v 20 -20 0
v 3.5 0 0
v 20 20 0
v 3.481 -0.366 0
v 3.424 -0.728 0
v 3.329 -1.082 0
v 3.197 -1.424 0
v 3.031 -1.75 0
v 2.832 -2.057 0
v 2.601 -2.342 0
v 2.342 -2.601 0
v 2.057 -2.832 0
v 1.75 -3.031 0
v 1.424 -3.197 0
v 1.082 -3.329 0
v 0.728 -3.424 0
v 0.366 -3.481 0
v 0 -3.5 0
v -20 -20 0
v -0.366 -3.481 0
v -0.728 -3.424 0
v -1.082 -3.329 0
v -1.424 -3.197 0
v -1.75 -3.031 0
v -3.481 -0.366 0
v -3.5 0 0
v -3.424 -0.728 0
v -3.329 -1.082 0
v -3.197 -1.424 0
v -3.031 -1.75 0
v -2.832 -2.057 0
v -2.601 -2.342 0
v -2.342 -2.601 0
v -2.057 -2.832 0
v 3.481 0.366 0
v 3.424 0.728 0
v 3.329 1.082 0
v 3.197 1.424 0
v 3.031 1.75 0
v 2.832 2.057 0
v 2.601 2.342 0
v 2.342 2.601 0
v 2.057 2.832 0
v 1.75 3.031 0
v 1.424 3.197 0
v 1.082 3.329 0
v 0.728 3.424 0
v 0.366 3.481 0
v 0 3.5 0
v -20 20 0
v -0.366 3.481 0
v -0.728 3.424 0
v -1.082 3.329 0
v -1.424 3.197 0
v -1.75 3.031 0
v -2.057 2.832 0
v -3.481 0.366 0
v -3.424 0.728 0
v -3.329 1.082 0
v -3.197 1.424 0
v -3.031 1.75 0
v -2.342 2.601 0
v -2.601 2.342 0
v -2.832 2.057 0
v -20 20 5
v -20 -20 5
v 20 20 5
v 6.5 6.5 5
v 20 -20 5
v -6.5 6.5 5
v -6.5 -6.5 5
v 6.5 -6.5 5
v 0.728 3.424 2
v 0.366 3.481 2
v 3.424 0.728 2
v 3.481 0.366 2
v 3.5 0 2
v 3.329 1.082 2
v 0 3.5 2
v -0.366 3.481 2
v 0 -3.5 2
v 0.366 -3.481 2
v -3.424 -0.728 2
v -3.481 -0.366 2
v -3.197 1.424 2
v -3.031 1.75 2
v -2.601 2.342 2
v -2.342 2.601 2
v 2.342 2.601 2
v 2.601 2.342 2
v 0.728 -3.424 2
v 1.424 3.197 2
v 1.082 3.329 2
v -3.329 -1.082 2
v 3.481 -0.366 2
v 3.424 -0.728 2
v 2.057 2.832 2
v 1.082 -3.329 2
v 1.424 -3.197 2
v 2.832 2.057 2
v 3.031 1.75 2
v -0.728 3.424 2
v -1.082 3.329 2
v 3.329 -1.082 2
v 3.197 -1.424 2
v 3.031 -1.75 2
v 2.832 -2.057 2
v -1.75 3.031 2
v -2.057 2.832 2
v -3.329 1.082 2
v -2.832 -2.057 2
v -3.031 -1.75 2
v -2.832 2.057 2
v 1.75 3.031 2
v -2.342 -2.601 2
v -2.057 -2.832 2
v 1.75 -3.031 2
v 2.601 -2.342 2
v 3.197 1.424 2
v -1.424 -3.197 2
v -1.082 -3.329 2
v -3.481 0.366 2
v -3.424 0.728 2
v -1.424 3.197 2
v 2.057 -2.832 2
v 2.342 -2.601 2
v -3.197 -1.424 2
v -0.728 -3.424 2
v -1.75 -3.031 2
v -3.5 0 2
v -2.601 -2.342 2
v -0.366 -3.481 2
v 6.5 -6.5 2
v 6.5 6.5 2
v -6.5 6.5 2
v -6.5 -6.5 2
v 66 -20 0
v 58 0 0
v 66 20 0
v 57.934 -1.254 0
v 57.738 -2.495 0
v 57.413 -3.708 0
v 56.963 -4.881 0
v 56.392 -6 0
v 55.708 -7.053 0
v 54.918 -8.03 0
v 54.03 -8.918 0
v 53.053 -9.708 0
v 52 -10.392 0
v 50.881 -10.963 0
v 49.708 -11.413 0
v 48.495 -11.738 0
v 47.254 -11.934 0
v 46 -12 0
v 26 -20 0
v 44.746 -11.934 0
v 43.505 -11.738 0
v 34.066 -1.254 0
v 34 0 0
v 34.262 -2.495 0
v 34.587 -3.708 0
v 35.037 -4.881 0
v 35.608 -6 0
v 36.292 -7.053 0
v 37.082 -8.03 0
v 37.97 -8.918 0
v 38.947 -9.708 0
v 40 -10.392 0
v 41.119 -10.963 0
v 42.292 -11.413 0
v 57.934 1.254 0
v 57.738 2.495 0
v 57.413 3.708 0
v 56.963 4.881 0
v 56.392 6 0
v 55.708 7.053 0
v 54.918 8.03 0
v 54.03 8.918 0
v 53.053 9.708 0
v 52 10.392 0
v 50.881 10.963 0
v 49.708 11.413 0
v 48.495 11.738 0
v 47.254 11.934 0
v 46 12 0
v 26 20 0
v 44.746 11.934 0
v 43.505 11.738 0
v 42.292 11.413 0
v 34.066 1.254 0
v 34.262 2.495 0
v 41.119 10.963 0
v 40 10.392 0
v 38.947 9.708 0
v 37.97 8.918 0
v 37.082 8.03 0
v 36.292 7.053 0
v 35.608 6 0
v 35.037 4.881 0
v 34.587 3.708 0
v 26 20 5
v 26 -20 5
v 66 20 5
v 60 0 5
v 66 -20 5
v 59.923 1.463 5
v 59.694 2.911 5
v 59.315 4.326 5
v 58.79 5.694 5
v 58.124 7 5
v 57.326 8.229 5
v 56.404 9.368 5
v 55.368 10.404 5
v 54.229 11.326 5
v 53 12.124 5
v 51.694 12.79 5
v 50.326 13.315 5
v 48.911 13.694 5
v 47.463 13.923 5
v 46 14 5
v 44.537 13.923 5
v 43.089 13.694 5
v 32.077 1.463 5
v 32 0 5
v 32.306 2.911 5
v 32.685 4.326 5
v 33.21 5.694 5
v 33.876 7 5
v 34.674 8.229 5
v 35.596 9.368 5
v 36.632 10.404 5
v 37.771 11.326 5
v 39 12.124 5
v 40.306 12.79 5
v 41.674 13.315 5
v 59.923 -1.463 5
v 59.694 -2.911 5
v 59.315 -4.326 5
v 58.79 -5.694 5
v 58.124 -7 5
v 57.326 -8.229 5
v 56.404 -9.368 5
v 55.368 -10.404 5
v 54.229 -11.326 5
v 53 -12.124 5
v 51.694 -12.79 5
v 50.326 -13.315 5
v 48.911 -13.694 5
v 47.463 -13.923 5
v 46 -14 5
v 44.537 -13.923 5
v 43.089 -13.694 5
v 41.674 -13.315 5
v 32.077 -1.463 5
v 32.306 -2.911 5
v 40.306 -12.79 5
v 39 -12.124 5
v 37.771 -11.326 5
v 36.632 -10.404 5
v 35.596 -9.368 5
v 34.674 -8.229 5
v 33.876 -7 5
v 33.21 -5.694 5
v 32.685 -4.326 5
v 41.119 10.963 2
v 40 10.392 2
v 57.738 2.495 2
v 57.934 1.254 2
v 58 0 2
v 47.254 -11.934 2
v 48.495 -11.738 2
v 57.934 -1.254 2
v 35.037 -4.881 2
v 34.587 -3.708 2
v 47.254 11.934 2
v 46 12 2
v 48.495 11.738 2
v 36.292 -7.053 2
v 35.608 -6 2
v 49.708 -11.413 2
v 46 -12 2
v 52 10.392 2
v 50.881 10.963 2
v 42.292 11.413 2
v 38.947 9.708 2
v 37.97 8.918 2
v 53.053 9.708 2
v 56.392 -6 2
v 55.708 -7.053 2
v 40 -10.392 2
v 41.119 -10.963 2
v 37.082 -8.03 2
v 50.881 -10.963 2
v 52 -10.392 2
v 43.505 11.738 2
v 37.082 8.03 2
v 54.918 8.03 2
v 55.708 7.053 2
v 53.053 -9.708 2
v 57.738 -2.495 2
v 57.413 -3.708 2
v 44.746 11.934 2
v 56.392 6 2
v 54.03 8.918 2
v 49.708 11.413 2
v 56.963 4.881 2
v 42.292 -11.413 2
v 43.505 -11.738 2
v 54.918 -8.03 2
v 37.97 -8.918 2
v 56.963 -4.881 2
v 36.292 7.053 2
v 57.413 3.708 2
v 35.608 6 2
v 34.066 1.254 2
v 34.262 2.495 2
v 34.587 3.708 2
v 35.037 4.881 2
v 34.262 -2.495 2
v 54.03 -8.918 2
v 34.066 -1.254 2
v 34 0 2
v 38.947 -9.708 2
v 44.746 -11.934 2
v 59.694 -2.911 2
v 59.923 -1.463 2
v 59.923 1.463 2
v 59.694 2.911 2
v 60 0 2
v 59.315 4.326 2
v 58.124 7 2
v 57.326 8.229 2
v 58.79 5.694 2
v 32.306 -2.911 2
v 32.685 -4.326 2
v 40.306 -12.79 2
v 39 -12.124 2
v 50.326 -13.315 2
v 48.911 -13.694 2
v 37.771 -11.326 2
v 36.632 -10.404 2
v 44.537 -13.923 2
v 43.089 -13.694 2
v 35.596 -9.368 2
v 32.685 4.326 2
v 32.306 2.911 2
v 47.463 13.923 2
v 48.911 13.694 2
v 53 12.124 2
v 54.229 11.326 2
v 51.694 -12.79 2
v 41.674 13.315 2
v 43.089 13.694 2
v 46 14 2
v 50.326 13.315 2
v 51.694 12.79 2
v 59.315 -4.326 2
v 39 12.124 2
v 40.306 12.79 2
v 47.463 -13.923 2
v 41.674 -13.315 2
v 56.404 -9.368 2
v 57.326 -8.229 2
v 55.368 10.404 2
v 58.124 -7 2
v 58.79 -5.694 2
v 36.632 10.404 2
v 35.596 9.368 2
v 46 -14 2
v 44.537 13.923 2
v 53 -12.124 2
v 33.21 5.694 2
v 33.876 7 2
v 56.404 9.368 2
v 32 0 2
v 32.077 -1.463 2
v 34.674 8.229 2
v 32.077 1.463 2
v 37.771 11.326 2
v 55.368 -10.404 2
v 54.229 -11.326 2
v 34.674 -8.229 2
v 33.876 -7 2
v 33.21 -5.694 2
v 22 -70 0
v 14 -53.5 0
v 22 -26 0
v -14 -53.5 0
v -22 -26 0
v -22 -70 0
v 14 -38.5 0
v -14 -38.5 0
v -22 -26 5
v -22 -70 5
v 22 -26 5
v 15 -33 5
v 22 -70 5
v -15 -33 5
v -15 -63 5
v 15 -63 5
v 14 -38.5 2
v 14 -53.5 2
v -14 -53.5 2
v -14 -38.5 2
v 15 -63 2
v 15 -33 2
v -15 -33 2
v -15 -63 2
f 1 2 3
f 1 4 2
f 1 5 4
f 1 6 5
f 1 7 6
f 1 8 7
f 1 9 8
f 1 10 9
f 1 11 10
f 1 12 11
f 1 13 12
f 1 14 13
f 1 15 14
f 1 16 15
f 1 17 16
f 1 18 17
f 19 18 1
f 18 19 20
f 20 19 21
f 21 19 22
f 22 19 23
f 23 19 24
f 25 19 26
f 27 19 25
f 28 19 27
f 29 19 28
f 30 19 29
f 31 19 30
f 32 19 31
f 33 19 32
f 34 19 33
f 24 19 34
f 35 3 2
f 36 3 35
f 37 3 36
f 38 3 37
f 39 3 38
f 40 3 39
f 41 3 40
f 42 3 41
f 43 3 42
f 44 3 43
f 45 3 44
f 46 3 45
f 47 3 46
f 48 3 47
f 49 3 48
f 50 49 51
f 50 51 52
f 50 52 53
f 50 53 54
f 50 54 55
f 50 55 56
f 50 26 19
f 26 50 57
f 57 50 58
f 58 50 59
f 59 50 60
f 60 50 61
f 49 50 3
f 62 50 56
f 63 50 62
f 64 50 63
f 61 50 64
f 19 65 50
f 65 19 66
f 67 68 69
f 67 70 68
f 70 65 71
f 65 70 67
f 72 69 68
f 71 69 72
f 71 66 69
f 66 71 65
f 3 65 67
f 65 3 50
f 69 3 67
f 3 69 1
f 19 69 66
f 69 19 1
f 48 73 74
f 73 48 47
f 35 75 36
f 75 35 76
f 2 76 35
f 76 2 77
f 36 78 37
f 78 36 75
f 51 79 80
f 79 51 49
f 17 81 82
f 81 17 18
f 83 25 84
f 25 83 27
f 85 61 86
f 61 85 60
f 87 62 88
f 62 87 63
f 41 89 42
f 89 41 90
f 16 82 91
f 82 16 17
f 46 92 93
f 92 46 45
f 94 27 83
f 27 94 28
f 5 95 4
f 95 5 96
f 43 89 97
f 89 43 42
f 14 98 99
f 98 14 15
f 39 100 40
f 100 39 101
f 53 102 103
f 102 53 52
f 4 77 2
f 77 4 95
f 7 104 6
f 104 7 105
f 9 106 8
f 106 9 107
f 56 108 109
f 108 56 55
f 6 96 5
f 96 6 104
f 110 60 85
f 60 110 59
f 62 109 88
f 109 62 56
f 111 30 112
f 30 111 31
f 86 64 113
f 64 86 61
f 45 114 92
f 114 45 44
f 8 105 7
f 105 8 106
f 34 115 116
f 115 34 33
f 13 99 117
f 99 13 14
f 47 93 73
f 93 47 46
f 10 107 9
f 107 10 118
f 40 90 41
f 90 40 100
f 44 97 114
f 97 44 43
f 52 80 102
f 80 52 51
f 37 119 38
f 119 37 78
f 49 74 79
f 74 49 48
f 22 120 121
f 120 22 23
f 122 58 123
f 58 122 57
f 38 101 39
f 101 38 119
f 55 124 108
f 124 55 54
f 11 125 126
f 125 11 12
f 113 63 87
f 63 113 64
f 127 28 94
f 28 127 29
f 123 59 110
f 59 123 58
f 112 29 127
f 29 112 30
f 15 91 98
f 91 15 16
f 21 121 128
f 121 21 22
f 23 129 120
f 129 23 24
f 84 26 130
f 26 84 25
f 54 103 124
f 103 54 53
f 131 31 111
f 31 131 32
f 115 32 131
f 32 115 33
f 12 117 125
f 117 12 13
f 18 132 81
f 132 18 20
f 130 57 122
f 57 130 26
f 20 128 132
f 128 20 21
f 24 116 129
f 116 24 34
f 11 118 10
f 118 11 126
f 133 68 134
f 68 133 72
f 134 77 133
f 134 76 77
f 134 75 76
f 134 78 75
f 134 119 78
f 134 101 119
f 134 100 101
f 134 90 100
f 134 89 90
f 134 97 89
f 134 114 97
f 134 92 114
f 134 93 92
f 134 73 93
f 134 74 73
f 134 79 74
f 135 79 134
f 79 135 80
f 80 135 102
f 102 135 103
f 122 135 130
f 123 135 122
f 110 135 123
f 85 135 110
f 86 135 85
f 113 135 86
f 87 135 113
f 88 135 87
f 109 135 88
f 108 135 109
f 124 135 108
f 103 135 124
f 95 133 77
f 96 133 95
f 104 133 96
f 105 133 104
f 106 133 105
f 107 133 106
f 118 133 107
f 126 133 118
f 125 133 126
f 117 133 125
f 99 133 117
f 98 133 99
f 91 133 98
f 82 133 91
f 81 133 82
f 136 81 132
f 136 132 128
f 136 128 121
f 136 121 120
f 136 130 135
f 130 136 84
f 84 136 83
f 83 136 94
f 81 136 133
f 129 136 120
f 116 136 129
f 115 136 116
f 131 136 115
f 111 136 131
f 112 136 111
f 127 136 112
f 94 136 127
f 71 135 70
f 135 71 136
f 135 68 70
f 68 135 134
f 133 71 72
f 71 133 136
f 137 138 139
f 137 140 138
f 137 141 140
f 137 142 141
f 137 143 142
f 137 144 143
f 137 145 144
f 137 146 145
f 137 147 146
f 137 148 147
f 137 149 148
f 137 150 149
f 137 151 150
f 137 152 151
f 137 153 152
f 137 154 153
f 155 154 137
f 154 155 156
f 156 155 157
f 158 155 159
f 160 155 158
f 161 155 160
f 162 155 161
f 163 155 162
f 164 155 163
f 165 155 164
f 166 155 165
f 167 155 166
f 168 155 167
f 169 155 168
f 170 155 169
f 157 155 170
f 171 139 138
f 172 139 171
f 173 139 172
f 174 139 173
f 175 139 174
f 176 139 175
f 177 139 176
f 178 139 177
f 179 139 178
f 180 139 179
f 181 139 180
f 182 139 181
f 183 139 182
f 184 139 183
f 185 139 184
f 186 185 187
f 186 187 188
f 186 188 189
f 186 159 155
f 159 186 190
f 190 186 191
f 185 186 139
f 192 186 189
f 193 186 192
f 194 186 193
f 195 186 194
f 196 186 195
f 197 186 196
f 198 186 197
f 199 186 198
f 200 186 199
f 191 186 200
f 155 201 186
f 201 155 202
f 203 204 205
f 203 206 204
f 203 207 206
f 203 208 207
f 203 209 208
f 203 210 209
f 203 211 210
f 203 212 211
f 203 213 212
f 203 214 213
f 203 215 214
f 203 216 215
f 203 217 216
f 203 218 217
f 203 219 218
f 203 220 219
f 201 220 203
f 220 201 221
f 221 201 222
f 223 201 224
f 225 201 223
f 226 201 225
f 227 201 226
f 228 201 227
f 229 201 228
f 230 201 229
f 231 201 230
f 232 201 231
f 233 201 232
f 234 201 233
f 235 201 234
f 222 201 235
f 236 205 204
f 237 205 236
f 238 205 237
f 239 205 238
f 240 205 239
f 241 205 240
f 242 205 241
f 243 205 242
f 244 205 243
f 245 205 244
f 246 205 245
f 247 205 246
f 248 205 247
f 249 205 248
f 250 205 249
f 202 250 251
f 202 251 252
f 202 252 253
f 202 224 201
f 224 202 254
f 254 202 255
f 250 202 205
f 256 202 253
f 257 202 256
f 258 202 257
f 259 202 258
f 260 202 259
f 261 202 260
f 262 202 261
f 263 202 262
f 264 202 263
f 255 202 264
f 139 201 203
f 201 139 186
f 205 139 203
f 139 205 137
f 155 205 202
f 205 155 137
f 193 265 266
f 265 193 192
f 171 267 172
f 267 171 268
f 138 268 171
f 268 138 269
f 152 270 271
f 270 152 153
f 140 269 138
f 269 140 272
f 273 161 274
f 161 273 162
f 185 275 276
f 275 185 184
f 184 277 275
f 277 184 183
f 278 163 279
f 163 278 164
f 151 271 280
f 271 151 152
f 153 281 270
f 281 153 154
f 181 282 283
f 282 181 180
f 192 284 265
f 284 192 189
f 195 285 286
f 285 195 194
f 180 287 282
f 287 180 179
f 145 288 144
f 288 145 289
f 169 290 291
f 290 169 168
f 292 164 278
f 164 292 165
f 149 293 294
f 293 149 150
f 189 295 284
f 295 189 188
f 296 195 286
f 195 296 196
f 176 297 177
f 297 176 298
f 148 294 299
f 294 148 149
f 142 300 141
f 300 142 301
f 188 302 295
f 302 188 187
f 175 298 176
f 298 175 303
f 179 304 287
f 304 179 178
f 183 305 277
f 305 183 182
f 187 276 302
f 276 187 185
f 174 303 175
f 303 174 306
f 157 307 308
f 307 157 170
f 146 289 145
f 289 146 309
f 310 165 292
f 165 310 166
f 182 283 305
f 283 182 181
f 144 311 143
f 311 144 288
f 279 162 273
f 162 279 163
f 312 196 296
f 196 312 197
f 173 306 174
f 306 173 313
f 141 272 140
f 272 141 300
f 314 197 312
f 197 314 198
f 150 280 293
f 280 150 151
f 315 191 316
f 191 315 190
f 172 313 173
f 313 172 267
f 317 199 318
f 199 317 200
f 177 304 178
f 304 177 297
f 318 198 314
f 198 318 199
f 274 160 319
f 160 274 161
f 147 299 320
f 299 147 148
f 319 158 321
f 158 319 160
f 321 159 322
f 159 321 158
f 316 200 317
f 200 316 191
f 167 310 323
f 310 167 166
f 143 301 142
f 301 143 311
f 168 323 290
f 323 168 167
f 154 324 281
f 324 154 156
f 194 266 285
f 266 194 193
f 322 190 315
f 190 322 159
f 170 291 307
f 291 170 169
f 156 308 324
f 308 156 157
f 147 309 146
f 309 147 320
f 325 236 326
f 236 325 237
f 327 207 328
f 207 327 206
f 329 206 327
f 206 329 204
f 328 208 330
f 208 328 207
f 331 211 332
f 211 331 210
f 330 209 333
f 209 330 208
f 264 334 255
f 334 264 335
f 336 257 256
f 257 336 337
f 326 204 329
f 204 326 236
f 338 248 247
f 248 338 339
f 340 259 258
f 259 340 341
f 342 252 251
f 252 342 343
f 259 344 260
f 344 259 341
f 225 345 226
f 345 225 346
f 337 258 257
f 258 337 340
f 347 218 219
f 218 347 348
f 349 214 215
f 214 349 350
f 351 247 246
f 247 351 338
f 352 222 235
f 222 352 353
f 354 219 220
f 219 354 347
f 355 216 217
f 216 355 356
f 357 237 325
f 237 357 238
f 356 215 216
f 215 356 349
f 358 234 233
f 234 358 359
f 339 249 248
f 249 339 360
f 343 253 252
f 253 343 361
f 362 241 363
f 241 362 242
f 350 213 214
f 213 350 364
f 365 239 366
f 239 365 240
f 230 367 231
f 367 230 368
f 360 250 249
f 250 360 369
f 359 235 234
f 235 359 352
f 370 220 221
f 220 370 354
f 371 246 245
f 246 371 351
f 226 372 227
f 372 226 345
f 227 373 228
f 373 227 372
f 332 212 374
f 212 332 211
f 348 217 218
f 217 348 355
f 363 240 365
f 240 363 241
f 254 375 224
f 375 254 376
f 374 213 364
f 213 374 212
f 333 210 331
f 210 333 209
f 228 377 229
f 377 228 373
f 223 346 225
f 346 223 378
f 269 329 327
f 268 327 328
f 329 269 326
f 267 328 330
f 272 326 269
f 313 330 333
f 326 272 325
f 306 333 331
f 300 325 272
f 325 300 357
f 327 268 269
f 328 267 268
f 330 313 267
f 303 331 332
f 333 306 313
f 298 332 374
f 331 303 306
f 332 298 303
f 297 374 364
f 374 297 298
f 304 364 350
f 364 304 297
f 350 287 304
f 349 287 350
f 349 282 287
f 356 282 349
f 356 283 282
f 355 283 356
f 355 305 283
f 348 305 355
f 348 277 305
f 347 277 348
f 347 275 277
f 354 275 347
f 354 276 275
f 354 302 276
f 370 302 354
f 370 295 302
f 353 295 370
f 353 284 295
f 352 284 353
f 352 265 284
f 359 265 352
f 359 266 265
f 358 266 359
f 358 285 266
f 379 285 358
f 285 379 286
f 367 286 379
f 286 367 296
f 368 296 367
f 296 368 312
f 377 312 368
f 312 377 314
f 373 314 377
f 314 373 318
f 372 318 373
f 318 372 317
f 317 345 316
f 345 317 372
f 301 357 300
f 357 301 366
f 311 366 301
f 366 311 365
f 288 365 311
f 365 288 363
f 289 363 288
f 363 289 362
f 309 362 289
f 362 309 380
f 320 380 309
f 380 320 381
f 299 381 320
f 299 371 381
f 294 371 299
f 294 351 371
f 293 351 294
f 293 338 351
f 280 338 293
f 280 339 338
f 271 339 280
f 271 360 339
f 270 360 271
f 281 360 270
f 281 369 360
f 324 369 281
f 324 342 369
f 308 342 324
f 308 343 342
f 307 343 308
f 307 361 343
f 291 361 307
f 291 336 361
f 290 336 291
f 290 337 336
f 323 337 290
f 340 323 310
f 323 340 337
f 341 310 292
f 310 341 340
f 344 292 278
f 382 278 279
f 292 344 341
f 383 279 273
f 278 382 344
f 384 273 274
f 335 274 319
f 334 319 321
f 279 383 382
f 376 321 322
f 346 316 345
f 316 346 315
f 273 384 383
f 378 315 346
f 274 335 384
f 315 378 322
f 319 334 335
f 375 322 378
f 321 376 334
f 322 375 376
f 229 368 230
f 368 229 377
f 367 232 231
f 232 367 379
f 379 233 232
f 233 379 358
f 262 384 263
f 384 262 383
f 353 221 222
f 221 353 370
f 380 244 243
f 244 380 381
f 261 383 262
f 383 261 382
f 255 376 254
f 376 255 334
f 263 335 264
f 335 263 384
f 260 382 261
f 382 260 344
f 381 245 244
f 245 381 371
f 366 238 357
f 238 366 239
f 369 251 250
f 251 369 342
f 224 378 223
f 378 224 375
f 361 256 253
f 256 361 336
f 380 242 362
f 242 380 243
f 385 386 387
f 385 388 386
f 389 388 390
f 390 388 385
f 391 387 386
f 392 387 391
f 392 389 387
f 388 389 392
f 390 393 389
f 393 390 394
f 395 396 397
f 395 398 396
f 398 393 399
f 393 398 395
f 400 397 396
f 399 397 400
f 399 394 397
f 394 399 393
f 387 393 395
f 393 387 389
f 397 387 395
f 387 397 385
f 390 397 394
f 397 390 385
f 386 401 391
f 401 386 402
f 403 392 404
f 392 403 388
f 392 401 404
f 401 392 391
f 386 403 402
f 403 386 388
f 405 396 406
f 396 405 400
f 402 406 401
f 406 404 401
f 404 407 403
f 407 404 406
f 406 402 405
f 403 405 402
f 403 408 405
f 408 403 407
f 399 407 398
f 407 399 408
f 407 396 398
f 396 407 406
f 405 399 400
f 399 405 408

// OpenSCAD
/*
 * ChromaCade — Mk 2 Component Fit Test Plates
 *
 * Tests only the cutouts revised since test-component-holes.scad.
 * Print all 3 before committing to the full case print.
 *
 * Plate   Component           What changed / what to check
 * ─────────────────────────────────────────────────────────────────────────────
 *   A     EC11 encoder        ø7mm through + 13×13mm back countersink (~3mm deep)
 *                             Check: bushing seats flush, nut threads catch in pocket
 *   C     WS2812 LED ring     ø24mm front aperture + ø28mm back recess (~3mm deep)
 *                             Check: LED circle fully visible; PCB sits in recess, glue gap ~1.3mm
 *   D     0.96" OLED          28×15mm front window (2mm off-center) + 30×30mm back
 *                             countersink (~3mm deep) -- all confirmed correct 2026-08-19
 *                             Check: viewable area fully open; module PCB drops into pocket squarely
 *
 * Plate B (KY-023 joystick mounting bosses) removed 2026-08-19 -- see the
 * comment above test_led_ring_mk2() below, it moved to its own isolated
 * file (enclosure/joystick-mount-dev.scad) since its print orientation
 * doesn't fit this file's flat-plate convention.
 *
 * Plate E (old single-cone stadium speaker grille) removed 2026-08-19 -- the
 * speaker design changed to a dual-cone housing with round grilles (see
 * chromacade-blank-side.scad's spk_cone_d/spk_cone_offset); the old stadium
 * shape no longer matches anything real. No replacement test plate yet.
 *
 * Print orientation: BACK FACE UP (countersinks and recesses face up toward you).
 * Insert parts from the underside to test fit and thread engagement.
 *
 * Bed footprint (PART="ALL"): ~86mm × 94mm — fits an 8"×8" bed with margin.
 * Set PART below to print just one plate instead of all 3.
 */

/* [Render Selection] */
PART = "ALL";
// [ALL, A, C, D]

$fn = 60;

wall   = 5;      // matches case wall thickness

// ─── A: EC11 Rotary Encoder ───────────────────────────────────────────────────
module test_encoder_mk2() {
    pw = 40; ph = 40;
    difference() {
        linear_extrude(wall) square([pw, ph], center=true);
        // M7 bushing through-hole — enters from bottom (front of panel)
        translate([0, 0, wall/2])
            cylinder(h=wall*3, d=7, center=true);
        // Back countersink — 13×13mm, centered on the back face (~3mm effective depth)
        translate([0, 0, wall])
            cube([13, 13, 6], center=true);
    }
}

// Plate B (KY-023 joystick mounting bosses) removed 2026-08-19 -- pulled
// into its own isolated file, enclosure/joystick-mount-dev.scad, per
// direct feedback that the straight-up-and-down bosses here got in the
// way of the joystick's range of motion, didn't have enough material
// around two of the four screws, and (found while redesigning) weren't
// actually support-free to print either. That file's ramp direction is
// tied to blank-side's real print-vertical axis in a way that doesn't fit
// this plate's flat, Z-thickness convention -- see its own header comment
// for why it needs a different print orientation than plates A/C/D below,
// and its own "PRINTABLE" mode for an actual print-ready coupon instead of
// trying to force this design back into a plate here.

// ─── C: WS2812 7-LED Ring ─────────────────────────────────────────────────────
module test_led_ring_mk2() {
    pw = 40; ph = 40;
    difference() {
        linear_extrude(wall) square([pw, ph], center=true);
        // Front aperture — d=24 exposes full 23mm LED circle (0.5mm margin)
        translate([0, 0, wall/2])
            cylinder(h=wall*3, d=24, center=true);
        // Back recess — d=28, centered on the back face (~3mm effective depth);
        // PCB ~25.4mm glues in with ~1.3mm gap
        translate([0, 0, wall])
            cylinder(h=6, d=28, center=true);
    }
}

// ─── D: 0.96" OLED Display ────────────────────────────────────────────────────
module test_oled_mk2() {
    pw = 44; ph = 44;
    difference() {
        linear_extrude(wall) square([pw, ph], center=true);
        // Front window — 28×15mm viewable area, offset 2mm off-center
        translate([0, 2, wall/2])
            cube([28, 15, wall*3], center=true);
        // Back countersink — 30×30mm, centered on the back face (~3mm effective depth)
        translate([0, 0, wall])
            cube([30, 30, 6], center=true);
    }
}

// ─── Layout ───────────────────────────────────────────────────────────────────
//  Row 0 (Y=0):     A Encoder    C LED Ring
//  Row 1 (below):   D OLED

pitch_sm = 40 + 6;  // 46mm between 40mm-plate centres

// Row 1 Y: gap from bottom edge of row 0 plates (A/C both 40mm -> half=20)
// to top of row 1 plates (D, 44mm tall -> half=22)
row1_y = -(20 + 6 + 22);  // −48mm

if (PART == "ALL") {
    translate([0,           0,       0]) test_encoder_mk2();
    translate([pitch_sm,    0,       0]) test_led_ring_mk2();
    translate([0,           row1_y,  0]) test_oled_mk2();
}
else if (PART == "A") test_encoder_mk2();
else if (PART == "C") test_led_ring_mk2();
else if (PART == "D") test_oled_mk2();
